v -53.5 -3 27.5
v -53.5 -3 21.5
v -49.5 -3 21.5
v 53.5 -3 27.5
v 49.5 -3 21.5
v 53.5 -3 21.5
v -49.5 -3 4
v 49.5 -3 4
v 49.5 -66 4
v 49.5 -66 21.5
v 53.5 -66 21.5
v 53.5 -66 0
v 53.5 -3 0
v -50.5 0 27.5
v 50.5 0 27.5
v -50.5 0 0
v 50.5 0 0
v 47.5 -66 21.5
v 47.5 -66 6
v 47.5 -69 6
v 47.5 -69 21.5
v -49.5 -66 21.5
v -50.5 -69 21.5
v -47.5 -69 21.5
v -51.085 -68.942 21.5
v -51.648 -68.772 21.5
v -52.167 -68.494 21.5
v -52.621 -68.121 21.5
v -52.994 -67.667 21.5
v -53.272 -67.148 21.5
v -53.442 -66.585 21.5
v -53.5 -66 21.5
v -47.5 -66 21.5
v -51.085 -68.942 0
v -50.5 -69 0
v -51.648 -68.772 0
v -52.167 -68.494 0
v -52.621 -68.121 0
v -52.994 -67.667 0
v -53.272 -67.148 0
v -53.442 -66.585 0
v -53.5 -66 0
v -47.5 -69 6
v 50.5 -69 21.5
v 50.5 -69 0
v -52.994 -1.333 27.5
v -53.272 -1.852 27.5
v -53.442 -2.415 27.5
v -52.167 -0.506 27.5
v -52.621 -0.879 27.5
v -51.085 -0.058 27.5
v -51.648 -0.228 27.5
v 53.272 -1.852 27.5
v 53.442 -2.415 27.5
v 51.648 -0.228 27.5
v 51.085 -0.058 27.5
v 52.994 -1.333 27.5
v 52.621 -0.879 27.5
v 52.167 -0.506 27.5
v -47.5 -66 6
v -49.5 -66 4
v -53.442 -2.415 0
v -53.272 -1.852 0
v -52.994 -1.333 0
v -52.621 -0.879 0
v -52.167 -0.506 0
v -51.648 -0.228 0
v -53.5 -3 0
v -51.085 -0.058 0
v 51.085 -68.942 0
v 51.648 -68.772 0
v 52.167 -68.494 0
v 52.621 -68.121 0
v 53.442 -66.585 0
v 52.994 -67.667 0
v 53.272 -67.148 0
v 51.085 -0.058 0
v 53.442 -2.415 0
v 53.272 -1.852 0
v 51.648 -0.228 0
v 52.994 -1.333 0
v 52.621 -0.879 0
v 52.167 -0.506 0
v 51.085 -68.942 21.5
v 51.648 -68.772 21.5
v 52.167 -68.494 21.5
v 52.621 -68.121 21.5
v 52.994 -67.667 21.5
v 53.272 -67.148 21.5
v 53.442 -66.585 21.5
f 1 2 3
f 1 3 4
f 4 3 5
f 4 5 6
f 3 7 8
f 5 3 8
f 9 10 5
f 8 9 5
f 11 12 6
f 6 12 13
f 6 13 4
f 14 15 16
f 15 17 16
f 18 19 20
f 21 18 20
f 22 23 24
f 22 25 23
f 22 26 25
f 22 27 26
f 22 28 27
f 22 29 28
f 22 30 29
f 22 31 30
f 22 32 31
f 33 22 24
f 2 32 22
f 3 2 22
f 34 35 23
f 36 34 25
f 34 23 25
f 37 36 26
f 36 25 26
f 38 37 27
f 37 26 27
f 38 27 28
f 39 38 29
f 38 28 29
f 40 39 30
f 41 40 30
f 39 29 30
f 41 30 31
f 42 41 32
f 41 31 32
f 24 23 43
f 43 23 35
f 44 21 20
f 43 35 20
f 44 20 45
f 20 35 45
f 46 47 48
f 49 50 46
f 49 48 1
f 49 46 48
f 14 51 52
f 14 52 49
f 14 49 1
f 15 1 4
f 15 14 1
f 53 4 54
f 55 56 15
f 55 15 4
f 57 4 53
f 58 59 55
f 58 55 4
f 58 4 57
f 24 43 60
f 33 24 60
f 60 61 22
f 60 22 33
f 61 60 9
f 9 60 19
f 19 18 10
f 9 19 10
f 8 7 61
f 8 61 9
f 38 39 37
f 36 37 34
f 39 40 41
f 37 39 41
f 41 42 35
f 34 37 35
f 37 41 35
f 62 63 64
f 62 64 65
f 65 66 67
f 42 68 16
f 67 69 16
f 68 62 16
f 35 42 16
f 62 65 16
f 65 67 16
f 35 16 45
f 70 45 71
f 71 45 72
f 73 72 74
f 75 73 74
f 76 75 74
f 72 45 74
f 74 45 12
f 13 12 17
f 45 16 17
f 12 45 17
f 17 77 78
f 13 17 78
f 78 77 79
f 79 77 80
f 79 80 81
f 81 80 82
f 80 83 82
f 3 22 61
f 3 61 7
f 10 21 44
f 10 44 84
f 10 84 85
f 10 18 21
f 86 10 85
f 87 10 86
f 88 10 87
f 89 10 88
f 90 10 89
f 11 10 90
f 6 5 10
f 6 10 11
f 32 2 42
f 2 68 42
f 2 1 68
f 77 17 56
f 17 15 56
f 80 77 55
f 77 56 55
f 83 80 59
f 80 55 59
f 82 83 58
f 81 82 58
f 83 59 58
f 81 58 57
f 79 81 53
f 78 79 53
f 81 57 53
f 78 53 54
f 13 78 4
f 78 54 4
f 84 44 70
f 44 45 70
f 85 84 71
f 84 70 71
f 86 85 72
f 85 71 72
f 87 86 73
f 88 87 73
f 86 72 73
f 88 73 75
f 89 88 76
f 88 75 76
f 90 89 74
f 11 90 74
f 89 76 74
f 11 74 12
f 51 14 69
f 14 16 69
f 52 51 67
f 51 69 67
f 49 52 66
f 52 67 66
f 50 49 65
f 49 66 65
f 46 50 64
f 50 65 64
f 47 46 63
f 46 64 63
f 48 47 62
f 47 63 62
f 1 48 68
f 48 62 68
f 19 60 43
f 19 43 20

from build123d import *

# Parameters (mm, degrees)
F0_W     = 107
F0_H     = 6
F1_DEPTH = 69
F3_DEPTH = 15.5
F4_W     = 2
F4_H     = 63
F4_W_2   = 95
F5_DEPTH = 17.5
F6_DEPTH = 6
F7_R     = 2.99999


# Not quite as in the source:
# - a fillet or chamfer is up to 0.001 mm smaller than in the source, because OpenCascade refuses the exact size


with BuildPart() as f1:
    # F0 (on Front) → F1 (new body)
    with BuildSketch(Plane.XZ):
        with Locations((0, 3)):
            Rectangle(F0_W, F0_H)
    extrude(amount=F1_DEPTH)

    # F2 (on face) → F3 (join)
    with BuildSketch(Plane.XY.offset(6)):
        Polygon((53.5, -3), (53.5, 0), (47.5, 0), (-47.5, 0), (-53.5, 0), (-53.5, -3), (-53.5, -69), (-47.5, -69), (-47.5, -3), (47.5, -3), (47.5, -69), (53.5, -69), align=None)
    extrude(amount=F3_DEPTH)

    # F4 (on face) → F5 (cut)
    with BuildSketch(Plane.XY.offset(21.5)):
        with Locations((-48.5, -34.5)):
            Rectangle(F4_W, F4_H)
        with Locations((0, -34.5)):
            Rectangle(F4_W_2, F4_H)
        with Locations((48.5, -34.5)):
            Rectangle(F4_W, F4_H)
    extrude(amount=-F5_DEPTH, mode=Mode.SUBTRACT)

    # F4 (on face) → F6 (join)
    with BuildSketch(Plane.XY.offset(21.5)):
        Polygon((-53.5, -3), (-49.5, -3), (-47.5, -3), (47.5, -3), (49.5, -3), (53.5, -3), (53.5, 0), (-53.5, 0), align=None)
    extrude(amount=F6_DEPTH)

    # F7 (radius 3 in the source; OpenCascade refuses exactly that, so slightly less here)
    f7_edges = [f1.edges().sort_by_distance(p)[0] for p in [
        (-53.5, -69, 10.75),
        (53.5, -69, 10.75),
        (53.5, 0, 13.75),
        (-53.5, 0, 13.75),
    ]]
    fillet(f7_edges, radius=F7_R)


solid = f1.part
